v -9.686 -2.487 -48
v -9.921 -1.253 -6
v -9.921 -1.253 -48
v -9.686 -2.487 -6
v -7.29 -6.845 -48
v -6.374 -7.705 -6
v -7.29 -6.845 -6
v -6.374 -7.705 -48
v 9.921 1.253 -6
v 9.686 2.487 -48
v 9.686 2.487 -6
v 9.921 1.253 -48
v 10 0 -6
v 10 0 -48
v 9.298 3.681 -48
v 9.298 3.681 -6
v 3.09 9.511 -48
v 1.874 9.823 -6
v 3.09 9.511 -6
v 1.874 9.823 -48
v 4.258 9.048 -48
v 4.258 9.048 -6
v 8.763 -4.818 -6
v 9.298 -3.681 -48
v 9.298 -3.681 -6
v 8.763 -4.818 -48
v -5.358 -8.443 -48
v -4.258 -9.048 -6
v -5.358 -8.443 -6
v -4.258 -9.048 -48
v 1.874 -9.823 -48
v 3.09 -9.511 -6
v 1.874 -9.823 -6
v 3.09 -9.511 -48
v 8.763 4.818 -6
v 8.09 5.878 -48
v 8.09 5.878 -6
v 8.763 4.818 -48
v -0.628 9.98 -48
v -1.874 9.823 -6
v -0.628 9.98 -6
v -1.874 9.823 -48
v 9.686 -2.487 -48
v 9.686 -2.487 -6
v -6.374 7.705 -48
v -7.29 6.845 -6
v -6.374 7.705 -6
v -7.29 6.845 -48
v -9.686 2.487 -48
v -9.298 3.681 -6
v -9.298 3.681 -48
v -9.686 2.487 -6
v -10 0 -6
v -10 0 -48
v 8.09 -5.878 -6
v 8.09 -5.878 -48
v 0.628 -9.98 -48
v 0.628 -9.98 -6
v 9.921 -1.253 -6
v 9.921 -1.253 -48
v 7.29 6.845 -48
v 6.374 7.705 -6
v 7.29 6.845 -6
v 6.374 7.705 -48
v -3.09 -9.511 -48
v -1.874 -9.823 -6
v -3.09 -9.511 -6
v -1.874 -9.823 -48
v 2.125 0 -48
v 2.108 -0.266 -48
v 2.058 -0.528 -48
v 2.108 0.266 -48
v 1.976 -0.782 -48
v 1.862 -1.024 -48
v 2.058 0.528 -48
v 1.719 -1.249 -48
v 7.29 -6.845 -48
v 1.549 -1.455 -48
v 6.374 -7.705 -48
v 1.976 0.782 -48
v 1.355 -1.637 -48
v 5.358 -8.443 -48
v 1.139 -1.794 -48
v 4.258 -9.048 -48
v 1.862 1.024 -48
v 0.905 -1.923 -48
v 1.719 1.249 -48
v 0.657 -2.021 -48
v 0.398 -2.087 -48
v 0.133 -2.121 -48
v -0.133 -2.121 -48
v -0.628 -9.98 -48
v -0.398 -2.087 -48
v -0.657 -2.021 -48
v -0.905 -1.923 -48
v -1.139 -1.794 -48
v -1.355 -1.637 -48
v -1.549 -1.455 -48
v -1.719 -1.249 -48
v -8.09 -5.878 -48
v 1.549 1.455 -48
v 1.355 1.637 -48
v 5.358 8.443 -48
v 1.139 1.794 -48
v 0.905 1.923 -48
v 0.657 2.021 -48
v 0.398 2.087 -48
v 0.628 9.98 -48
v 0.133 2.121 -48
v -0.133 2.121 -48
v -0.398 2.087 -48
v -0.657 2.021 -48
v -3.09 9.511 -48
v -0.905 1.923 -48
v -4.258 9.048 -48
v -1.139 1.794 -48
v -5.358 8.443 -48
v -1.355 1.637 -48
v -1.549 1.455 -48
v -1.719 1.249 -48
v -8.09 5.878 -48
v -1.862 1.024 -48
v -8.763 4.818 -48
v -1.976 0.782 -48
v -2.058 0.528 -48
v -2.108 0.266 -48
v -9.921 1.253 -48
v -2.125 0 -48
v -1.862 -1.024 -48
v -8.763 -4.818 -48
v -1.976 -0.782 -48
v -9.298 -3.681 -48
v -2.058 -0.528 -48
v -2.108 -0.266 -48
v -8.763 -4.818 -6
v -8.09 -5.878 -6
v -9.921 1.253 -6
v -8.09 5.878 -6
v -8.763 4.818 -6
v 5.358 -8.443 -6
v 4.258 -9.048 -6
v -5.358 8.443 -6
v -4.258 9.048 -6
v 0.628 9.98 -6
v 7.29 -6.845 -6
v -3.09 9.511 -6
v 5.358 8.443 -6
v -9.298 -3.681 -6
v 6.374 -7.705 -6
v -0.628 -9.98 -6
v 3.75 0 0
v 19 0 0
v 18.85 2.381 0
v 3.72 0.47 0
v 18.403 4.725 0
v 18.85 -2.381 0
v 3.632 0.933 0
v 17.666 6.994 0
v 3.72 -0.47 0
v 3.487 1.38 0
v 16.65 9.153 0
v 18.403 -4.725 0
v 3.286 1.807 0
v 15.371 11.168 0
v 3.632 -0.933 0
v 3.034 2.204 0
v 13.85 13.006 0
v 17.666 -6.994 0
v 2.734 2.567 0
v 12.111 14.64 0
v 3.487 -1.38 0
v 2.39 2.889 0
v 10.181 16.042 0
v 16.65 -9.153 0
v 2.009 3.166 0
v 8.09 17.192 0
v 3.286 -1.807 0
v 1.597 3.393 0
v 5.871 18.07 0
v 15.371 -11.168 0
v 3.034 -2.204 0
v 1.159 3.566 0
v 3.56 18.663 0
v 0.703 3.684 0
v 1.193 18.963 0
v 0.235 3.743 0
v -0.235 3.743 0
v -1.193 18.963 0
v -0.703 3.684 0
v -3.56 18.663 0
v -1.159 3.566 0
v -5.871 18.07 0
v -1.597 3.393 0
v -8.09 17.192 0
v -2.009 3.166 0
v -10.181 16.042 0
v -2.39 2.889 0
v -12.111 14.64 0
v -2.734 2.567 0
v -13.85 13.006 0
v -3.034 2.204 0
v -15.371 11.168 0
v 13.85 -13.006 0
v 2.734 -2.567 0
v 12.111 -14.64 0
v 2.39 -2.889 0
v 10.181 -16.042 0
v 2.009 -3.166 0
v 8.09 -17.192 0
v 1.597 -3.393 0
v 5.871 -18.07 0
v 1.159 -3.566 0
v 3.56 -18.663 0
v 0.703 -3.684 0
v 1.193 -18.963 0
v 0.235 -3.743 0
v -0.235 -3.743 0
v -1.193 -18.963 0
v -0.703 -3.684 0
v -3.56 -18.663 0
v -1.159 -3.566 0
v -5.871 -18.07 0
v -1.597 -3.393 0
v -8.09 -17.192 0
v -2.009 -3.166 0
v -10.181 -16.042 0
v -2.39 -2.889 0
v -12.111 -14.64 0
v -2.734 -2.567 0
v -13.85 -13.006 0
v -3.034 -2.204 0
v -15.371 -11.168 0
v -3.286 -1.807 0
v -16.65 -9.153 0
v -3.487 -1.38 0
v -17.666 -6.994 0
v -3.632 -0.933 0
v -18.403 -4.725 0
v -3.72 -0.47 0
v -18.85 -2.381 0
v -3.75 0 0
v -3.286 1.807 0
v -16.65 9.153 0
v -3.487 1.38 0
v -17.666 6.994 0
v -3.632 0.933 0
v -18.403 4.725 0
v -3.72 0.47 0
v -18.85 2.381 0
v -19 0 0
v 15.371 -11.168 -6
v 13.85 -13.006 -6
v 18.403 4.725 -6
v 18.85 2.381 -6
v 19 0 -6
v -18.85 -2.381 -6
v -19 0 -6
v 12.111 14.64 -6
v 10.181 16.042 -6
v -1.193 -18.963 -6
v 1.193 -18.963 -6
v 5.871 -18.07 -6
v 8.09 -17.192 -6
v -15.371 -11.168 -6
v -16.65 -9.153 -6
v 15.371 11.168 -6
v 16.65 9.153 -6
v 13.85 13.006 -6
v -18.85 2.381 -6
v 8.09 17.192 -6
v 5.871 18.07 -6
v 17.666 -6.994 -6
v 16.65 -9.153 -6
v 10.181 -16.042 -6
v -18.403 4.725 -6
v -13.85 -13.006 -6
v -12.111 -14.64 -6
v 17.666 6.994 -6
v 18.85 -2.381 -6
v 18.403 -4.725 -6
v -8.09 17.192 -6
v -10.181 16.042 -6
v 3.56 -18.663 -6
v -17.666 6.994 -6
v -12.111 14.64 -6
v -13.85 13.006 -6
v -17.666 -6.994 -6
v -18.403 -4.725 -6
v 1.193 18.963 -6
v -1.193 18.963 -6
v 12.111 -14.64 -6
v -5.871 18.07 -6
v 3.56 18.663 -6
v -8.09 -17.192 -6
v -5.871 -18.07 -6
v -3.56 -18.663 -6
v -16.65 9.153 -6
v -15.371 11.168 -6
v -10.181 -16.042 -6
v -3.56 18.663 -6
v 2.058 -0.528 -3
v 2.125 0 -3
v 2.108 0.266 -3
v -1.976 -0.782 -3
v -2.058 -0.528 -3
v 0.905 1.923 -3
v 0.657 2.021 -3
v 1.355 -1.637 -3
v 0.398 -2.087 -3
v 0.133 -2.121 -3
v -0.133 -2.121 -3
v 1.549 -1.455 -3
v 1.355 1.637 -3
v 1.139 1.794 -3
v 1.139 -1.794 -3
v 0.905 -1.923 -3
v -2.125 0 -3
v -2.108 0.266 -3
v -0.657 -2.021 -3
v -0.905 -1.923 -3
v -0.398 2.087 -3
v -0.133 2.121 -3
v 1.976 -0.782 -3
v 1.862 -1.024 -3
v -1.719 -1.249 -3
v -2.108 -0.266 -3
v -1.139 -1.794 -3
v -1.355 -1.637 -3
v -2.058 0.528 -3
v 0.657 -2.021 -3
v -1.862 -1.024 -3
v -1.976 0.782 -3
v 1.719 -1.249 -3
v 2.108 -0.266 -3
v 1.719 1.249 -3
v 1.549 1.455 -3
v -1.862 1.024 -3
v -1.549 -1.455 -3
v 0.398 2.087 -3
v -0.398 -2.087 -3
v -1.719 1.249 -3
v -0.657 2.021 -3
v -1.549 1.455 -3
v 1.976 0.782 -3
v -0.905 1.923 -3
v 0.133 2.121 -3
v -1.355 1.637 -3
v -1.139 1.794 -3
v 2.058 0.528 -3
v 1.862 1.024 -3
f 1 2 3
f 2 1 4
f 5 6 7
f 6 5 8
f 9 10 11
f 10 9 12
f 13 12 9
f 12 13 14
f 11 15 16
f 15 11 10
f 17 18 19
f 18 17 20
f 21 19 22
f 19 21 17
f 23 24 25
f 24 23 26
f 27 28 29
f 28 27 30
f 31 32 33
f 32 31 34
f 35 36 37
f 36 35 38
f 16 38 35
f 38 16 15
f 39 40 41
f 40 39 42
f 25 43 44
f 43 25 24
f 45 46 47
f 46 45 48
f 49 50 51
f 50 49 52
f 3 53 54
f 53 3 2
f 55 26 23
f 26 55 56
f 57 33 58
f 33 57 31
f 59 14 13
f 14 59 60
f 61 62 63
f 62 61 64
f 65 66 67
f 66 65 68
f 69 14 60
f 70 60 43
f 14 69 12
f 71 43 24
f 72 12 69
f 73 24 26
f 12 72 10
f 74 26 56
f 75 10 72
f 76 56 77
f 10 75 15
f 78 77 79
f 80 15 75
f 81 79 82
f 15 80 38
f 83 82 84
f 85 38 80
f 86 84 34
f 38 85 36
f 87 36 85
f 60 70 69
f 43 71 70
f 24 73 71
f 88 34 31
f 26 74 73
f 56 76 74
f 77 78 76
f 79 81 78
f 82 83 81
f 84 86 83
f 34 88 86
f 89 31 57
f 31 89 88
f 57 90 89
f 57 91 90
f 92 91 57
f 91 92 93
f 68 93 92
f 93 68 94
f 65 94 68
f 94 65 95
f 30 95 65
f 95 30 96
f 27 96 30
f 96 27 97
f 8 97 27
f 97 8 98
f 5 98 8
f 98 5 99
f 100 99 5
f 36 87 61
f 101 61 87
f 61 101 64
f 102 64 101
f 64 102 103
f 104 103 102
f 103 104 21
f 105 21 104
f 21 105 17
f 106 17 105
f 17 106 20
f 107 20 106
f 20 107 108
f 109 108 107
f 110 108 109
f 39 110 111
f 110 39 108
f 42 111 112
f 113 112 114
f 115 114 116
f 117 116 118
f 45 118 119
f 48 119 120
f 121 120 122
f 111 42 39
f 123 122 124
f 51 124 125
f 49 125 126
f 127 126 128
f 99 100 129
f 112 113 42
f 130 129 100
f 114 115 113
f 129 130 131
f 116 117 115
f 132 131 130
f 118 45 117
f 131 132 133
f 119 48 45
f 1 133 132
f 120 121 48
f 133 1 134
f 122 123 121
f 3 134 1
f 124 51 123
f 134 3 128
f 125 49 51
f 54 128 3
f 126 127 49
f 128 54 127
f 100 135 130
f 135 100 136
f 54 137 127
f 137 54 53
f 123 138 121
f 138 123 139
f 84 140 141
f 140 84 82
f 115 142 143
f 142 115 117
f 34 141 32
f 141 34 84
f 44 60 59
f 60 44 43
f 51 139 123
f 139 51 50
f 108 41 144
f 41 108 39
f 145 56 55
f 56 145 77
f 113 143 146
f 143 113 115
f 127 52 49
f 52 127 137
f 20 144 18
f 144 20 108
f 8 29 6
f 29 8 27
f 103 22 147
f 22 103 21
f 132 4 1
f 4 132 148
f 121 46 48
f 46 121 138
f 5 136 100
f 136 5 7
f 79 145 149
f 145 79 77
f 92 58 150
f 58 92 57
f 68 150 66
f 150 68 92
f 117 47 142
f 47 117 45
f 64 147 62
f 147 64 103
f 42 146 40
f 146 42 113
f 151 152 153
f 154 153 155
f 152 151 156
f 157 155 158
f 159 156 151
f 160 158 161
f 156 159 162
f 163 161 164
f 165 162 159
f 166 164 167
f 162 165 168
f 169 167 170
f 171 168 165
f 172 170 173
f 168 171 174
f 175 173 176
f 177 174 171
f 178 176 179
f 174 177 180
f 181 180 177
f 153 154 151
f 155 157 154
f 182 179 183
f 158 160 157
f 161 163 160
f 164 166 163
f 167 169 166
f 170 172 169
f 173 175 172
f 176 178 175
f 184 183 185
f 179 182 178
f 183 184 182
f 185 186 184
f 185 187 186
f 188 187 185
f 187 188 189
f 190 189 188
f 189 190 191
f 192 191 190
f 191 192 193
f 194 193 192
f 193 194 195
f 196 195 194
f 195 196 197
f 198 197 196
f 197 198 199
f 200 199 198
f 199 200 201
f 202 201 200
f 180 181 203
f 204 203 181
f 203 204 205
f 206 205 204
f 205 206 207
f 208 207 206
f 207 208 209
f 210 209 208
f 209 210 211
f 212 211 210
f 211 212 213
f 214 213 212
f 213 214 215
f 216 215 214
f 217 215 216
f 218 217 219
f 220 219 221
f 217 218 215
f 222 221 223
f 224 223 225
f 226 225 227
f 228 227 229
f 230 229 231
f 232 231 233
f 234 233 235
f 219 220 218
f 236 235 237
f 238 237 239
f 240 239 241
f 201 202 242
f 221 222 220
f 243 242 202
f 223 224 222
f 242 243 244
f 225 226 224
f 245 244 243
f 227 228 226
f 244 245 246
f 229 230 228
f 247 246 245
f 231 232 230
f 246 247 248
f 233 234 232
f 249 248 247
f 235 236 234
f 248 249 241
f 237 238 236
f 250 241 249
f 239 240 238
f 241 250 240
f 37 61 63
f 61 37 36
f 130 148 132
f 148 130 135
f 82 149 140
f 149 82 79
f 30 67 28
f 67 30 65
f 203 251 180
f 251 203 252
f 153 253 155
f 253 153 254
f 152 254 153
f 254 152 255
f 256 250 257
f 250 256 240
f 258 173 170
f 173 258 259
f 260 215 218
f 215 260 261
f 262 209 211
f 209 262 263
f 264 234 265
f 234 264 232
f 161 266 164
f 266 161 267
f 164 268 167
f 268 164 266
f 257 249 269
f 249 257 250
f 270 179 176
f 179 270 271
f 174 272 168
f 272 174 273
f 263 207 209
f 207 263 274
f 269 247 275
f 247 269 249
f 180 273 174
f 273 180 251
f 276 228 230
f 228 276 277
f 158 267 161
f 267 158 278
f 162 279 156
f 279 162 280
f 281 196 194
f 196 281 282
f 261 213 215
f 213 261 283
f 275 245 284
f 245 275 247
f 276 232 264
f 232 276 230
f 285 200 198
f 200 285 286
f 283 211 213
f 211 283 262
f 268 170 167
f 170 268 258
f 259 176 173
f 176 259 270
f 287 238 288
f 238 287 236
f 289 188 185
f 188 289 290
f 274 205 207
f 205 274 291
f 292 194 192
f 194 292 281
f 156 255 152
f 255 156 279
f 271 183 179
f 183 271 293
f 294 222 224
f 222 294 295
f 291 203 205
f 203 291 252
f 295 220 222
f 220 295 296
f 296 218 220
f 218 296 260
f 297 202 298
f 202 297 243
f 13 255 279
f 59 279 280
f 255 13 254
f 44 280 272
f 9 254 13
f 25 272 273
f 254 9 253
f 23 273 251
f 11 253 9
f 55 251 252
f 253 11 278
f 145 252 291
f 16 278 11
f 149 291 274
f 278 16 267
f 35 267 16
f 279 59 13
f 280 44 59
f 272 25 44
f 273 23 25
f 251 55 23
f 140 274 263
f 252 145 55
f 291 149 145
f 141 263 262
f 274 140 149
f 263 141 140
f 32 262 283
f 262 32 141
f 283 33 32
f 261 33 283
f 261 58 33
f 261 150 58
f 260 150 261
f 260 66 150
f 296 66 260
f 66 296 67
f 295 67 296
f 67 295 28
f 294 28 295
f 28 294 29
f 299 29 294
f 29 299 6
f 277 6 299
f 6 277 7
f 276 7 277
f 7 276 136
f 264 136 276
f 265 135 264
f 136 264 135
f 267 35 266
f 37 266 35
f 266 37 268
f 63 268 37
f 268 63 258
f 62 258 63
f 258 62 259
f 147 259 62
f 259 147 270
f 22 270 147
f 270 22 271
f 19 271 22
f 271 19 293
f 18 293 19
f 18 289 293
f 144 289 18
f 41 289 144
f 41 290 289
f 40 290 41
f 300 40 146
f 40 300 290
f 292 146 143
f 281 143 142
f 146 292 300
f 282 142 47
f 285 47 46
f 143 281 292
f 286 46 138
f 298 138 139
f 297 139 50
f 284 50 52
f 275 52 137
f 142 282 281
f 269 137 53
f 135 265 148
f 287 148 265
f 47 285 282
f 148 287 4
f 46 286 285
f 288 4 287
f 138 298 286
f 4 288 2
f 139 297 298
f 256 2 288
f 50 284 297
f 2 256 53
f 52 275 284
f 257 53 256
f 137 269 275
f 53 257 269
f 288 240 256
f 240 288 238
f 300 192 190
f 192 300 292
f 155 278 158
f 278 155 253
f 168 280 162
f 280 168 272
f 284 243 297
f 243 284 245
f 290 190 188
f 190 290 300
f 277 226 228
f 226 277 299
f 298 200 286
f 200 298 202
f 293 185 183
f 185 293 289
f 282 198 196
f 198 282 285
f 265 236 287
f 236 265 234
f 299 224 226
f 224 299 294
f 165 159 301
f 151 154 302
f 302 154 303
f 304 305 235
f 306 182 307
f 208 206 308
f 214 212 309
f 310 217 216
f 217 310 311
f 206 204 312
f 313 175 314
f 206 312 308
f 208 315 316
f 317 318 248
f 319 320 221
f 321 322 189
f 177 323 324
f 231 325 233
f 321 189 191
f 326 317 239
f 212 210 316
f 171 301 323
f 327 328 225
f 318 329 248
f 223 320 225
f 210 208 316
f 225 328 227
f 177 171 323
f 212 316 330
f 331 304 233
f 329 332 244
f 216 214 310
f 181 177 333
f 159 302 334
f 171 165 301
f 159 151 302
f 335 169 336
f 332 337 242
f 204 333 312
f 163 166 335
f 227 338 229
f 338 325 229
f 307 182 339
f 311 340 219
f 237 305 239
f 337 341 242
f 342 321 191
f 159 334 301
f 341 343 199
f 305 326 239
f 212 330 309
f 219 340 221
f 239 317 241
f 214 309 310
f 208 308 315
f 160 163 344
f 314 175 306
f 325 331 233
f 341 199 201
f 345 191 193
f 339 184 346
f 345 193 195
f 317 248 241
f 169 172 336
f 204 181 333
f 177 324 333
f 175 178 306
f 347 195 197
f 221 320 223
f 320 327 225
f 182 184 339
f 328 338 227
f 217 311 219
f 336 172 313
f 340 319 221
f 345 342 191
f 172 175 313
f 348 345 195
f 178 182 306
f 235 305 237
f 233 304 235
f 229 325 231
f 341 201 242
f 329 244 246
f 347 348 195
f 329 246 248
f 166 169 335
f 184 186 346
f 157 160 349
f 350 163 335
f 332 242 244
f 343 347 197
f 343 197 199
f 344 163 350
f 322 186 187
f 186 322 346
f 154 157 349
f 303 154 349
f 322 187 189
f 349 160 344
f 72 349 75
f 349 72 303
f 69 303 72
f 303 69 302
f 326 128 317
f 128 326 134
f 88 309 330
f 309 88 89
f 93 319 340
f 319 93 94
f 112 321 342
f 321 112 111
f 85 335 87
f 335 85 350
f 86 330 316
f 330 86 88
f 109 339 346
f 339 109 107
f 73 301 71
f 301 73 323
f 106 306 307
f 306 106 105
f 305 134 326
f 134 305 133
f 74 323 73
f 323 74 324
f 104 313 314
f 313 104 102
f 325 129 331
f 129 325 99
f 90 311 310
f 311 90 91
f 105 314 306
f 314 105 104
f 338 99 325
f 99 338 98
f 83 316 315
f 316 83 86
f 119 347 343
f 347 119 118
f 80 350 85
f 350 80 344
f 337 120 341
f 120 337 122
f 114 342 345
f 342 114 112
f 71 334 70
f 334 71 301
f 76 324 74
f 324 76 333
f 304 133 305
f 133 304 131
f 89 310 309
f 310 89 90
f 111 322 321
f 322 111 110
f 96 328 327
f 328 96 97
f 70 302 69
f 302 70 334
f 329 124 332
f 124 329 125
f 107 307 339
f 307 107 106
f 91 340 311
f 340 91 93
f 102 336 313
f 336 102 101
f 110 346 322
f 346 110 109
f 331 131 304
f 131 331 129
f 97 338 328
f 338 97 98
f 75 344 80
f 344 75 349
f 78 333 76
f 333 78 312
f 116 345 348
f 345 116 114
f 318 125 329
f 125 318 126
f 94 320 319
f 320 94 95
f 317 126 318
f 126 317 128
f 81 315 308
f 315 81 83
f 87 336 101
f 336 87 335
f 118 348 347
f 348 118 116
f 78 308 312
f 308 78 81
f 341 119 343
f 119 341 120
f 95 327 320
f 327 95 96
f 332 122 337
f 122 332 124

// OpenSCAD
$fn = 50;


difference() {
	union() {
		translate(v = [0, 0, -48.0000000000]) {
			cylinder(h = 48, r = 10.0000000000);
		}
		translate(v = [0, 0, -6.0000000000]) {
			cylinder(h = 6, r = 19.0000000000);
		}
	}
	union() {
		translate(v = [0, 0, 0]) {
			rotate(a = [0, 0, 0]) {
				difference() {
					union() {
						#translate(v = [0, 0, -48.0000000000]) {
							cylinder(h = 48, r = 2.0000000000);
						}
						#translate(v = [0, 0, -3]) {
							cylinder(h = 3, r = 10.0000000000, r1 = 2.1250000000, r2 = 3.7500000000);
						}
						#translate(v = [0, 0, -48.0000000000]) {
							cylinder(h = 48, r = 2.1250000000);
						}
						#translate(v = [0, 0, -48.0000000000]) {
							cylinder(h = 48, r = 2.0000000000);
						}
					}
					union();
				}
			}
		}
	}
}
